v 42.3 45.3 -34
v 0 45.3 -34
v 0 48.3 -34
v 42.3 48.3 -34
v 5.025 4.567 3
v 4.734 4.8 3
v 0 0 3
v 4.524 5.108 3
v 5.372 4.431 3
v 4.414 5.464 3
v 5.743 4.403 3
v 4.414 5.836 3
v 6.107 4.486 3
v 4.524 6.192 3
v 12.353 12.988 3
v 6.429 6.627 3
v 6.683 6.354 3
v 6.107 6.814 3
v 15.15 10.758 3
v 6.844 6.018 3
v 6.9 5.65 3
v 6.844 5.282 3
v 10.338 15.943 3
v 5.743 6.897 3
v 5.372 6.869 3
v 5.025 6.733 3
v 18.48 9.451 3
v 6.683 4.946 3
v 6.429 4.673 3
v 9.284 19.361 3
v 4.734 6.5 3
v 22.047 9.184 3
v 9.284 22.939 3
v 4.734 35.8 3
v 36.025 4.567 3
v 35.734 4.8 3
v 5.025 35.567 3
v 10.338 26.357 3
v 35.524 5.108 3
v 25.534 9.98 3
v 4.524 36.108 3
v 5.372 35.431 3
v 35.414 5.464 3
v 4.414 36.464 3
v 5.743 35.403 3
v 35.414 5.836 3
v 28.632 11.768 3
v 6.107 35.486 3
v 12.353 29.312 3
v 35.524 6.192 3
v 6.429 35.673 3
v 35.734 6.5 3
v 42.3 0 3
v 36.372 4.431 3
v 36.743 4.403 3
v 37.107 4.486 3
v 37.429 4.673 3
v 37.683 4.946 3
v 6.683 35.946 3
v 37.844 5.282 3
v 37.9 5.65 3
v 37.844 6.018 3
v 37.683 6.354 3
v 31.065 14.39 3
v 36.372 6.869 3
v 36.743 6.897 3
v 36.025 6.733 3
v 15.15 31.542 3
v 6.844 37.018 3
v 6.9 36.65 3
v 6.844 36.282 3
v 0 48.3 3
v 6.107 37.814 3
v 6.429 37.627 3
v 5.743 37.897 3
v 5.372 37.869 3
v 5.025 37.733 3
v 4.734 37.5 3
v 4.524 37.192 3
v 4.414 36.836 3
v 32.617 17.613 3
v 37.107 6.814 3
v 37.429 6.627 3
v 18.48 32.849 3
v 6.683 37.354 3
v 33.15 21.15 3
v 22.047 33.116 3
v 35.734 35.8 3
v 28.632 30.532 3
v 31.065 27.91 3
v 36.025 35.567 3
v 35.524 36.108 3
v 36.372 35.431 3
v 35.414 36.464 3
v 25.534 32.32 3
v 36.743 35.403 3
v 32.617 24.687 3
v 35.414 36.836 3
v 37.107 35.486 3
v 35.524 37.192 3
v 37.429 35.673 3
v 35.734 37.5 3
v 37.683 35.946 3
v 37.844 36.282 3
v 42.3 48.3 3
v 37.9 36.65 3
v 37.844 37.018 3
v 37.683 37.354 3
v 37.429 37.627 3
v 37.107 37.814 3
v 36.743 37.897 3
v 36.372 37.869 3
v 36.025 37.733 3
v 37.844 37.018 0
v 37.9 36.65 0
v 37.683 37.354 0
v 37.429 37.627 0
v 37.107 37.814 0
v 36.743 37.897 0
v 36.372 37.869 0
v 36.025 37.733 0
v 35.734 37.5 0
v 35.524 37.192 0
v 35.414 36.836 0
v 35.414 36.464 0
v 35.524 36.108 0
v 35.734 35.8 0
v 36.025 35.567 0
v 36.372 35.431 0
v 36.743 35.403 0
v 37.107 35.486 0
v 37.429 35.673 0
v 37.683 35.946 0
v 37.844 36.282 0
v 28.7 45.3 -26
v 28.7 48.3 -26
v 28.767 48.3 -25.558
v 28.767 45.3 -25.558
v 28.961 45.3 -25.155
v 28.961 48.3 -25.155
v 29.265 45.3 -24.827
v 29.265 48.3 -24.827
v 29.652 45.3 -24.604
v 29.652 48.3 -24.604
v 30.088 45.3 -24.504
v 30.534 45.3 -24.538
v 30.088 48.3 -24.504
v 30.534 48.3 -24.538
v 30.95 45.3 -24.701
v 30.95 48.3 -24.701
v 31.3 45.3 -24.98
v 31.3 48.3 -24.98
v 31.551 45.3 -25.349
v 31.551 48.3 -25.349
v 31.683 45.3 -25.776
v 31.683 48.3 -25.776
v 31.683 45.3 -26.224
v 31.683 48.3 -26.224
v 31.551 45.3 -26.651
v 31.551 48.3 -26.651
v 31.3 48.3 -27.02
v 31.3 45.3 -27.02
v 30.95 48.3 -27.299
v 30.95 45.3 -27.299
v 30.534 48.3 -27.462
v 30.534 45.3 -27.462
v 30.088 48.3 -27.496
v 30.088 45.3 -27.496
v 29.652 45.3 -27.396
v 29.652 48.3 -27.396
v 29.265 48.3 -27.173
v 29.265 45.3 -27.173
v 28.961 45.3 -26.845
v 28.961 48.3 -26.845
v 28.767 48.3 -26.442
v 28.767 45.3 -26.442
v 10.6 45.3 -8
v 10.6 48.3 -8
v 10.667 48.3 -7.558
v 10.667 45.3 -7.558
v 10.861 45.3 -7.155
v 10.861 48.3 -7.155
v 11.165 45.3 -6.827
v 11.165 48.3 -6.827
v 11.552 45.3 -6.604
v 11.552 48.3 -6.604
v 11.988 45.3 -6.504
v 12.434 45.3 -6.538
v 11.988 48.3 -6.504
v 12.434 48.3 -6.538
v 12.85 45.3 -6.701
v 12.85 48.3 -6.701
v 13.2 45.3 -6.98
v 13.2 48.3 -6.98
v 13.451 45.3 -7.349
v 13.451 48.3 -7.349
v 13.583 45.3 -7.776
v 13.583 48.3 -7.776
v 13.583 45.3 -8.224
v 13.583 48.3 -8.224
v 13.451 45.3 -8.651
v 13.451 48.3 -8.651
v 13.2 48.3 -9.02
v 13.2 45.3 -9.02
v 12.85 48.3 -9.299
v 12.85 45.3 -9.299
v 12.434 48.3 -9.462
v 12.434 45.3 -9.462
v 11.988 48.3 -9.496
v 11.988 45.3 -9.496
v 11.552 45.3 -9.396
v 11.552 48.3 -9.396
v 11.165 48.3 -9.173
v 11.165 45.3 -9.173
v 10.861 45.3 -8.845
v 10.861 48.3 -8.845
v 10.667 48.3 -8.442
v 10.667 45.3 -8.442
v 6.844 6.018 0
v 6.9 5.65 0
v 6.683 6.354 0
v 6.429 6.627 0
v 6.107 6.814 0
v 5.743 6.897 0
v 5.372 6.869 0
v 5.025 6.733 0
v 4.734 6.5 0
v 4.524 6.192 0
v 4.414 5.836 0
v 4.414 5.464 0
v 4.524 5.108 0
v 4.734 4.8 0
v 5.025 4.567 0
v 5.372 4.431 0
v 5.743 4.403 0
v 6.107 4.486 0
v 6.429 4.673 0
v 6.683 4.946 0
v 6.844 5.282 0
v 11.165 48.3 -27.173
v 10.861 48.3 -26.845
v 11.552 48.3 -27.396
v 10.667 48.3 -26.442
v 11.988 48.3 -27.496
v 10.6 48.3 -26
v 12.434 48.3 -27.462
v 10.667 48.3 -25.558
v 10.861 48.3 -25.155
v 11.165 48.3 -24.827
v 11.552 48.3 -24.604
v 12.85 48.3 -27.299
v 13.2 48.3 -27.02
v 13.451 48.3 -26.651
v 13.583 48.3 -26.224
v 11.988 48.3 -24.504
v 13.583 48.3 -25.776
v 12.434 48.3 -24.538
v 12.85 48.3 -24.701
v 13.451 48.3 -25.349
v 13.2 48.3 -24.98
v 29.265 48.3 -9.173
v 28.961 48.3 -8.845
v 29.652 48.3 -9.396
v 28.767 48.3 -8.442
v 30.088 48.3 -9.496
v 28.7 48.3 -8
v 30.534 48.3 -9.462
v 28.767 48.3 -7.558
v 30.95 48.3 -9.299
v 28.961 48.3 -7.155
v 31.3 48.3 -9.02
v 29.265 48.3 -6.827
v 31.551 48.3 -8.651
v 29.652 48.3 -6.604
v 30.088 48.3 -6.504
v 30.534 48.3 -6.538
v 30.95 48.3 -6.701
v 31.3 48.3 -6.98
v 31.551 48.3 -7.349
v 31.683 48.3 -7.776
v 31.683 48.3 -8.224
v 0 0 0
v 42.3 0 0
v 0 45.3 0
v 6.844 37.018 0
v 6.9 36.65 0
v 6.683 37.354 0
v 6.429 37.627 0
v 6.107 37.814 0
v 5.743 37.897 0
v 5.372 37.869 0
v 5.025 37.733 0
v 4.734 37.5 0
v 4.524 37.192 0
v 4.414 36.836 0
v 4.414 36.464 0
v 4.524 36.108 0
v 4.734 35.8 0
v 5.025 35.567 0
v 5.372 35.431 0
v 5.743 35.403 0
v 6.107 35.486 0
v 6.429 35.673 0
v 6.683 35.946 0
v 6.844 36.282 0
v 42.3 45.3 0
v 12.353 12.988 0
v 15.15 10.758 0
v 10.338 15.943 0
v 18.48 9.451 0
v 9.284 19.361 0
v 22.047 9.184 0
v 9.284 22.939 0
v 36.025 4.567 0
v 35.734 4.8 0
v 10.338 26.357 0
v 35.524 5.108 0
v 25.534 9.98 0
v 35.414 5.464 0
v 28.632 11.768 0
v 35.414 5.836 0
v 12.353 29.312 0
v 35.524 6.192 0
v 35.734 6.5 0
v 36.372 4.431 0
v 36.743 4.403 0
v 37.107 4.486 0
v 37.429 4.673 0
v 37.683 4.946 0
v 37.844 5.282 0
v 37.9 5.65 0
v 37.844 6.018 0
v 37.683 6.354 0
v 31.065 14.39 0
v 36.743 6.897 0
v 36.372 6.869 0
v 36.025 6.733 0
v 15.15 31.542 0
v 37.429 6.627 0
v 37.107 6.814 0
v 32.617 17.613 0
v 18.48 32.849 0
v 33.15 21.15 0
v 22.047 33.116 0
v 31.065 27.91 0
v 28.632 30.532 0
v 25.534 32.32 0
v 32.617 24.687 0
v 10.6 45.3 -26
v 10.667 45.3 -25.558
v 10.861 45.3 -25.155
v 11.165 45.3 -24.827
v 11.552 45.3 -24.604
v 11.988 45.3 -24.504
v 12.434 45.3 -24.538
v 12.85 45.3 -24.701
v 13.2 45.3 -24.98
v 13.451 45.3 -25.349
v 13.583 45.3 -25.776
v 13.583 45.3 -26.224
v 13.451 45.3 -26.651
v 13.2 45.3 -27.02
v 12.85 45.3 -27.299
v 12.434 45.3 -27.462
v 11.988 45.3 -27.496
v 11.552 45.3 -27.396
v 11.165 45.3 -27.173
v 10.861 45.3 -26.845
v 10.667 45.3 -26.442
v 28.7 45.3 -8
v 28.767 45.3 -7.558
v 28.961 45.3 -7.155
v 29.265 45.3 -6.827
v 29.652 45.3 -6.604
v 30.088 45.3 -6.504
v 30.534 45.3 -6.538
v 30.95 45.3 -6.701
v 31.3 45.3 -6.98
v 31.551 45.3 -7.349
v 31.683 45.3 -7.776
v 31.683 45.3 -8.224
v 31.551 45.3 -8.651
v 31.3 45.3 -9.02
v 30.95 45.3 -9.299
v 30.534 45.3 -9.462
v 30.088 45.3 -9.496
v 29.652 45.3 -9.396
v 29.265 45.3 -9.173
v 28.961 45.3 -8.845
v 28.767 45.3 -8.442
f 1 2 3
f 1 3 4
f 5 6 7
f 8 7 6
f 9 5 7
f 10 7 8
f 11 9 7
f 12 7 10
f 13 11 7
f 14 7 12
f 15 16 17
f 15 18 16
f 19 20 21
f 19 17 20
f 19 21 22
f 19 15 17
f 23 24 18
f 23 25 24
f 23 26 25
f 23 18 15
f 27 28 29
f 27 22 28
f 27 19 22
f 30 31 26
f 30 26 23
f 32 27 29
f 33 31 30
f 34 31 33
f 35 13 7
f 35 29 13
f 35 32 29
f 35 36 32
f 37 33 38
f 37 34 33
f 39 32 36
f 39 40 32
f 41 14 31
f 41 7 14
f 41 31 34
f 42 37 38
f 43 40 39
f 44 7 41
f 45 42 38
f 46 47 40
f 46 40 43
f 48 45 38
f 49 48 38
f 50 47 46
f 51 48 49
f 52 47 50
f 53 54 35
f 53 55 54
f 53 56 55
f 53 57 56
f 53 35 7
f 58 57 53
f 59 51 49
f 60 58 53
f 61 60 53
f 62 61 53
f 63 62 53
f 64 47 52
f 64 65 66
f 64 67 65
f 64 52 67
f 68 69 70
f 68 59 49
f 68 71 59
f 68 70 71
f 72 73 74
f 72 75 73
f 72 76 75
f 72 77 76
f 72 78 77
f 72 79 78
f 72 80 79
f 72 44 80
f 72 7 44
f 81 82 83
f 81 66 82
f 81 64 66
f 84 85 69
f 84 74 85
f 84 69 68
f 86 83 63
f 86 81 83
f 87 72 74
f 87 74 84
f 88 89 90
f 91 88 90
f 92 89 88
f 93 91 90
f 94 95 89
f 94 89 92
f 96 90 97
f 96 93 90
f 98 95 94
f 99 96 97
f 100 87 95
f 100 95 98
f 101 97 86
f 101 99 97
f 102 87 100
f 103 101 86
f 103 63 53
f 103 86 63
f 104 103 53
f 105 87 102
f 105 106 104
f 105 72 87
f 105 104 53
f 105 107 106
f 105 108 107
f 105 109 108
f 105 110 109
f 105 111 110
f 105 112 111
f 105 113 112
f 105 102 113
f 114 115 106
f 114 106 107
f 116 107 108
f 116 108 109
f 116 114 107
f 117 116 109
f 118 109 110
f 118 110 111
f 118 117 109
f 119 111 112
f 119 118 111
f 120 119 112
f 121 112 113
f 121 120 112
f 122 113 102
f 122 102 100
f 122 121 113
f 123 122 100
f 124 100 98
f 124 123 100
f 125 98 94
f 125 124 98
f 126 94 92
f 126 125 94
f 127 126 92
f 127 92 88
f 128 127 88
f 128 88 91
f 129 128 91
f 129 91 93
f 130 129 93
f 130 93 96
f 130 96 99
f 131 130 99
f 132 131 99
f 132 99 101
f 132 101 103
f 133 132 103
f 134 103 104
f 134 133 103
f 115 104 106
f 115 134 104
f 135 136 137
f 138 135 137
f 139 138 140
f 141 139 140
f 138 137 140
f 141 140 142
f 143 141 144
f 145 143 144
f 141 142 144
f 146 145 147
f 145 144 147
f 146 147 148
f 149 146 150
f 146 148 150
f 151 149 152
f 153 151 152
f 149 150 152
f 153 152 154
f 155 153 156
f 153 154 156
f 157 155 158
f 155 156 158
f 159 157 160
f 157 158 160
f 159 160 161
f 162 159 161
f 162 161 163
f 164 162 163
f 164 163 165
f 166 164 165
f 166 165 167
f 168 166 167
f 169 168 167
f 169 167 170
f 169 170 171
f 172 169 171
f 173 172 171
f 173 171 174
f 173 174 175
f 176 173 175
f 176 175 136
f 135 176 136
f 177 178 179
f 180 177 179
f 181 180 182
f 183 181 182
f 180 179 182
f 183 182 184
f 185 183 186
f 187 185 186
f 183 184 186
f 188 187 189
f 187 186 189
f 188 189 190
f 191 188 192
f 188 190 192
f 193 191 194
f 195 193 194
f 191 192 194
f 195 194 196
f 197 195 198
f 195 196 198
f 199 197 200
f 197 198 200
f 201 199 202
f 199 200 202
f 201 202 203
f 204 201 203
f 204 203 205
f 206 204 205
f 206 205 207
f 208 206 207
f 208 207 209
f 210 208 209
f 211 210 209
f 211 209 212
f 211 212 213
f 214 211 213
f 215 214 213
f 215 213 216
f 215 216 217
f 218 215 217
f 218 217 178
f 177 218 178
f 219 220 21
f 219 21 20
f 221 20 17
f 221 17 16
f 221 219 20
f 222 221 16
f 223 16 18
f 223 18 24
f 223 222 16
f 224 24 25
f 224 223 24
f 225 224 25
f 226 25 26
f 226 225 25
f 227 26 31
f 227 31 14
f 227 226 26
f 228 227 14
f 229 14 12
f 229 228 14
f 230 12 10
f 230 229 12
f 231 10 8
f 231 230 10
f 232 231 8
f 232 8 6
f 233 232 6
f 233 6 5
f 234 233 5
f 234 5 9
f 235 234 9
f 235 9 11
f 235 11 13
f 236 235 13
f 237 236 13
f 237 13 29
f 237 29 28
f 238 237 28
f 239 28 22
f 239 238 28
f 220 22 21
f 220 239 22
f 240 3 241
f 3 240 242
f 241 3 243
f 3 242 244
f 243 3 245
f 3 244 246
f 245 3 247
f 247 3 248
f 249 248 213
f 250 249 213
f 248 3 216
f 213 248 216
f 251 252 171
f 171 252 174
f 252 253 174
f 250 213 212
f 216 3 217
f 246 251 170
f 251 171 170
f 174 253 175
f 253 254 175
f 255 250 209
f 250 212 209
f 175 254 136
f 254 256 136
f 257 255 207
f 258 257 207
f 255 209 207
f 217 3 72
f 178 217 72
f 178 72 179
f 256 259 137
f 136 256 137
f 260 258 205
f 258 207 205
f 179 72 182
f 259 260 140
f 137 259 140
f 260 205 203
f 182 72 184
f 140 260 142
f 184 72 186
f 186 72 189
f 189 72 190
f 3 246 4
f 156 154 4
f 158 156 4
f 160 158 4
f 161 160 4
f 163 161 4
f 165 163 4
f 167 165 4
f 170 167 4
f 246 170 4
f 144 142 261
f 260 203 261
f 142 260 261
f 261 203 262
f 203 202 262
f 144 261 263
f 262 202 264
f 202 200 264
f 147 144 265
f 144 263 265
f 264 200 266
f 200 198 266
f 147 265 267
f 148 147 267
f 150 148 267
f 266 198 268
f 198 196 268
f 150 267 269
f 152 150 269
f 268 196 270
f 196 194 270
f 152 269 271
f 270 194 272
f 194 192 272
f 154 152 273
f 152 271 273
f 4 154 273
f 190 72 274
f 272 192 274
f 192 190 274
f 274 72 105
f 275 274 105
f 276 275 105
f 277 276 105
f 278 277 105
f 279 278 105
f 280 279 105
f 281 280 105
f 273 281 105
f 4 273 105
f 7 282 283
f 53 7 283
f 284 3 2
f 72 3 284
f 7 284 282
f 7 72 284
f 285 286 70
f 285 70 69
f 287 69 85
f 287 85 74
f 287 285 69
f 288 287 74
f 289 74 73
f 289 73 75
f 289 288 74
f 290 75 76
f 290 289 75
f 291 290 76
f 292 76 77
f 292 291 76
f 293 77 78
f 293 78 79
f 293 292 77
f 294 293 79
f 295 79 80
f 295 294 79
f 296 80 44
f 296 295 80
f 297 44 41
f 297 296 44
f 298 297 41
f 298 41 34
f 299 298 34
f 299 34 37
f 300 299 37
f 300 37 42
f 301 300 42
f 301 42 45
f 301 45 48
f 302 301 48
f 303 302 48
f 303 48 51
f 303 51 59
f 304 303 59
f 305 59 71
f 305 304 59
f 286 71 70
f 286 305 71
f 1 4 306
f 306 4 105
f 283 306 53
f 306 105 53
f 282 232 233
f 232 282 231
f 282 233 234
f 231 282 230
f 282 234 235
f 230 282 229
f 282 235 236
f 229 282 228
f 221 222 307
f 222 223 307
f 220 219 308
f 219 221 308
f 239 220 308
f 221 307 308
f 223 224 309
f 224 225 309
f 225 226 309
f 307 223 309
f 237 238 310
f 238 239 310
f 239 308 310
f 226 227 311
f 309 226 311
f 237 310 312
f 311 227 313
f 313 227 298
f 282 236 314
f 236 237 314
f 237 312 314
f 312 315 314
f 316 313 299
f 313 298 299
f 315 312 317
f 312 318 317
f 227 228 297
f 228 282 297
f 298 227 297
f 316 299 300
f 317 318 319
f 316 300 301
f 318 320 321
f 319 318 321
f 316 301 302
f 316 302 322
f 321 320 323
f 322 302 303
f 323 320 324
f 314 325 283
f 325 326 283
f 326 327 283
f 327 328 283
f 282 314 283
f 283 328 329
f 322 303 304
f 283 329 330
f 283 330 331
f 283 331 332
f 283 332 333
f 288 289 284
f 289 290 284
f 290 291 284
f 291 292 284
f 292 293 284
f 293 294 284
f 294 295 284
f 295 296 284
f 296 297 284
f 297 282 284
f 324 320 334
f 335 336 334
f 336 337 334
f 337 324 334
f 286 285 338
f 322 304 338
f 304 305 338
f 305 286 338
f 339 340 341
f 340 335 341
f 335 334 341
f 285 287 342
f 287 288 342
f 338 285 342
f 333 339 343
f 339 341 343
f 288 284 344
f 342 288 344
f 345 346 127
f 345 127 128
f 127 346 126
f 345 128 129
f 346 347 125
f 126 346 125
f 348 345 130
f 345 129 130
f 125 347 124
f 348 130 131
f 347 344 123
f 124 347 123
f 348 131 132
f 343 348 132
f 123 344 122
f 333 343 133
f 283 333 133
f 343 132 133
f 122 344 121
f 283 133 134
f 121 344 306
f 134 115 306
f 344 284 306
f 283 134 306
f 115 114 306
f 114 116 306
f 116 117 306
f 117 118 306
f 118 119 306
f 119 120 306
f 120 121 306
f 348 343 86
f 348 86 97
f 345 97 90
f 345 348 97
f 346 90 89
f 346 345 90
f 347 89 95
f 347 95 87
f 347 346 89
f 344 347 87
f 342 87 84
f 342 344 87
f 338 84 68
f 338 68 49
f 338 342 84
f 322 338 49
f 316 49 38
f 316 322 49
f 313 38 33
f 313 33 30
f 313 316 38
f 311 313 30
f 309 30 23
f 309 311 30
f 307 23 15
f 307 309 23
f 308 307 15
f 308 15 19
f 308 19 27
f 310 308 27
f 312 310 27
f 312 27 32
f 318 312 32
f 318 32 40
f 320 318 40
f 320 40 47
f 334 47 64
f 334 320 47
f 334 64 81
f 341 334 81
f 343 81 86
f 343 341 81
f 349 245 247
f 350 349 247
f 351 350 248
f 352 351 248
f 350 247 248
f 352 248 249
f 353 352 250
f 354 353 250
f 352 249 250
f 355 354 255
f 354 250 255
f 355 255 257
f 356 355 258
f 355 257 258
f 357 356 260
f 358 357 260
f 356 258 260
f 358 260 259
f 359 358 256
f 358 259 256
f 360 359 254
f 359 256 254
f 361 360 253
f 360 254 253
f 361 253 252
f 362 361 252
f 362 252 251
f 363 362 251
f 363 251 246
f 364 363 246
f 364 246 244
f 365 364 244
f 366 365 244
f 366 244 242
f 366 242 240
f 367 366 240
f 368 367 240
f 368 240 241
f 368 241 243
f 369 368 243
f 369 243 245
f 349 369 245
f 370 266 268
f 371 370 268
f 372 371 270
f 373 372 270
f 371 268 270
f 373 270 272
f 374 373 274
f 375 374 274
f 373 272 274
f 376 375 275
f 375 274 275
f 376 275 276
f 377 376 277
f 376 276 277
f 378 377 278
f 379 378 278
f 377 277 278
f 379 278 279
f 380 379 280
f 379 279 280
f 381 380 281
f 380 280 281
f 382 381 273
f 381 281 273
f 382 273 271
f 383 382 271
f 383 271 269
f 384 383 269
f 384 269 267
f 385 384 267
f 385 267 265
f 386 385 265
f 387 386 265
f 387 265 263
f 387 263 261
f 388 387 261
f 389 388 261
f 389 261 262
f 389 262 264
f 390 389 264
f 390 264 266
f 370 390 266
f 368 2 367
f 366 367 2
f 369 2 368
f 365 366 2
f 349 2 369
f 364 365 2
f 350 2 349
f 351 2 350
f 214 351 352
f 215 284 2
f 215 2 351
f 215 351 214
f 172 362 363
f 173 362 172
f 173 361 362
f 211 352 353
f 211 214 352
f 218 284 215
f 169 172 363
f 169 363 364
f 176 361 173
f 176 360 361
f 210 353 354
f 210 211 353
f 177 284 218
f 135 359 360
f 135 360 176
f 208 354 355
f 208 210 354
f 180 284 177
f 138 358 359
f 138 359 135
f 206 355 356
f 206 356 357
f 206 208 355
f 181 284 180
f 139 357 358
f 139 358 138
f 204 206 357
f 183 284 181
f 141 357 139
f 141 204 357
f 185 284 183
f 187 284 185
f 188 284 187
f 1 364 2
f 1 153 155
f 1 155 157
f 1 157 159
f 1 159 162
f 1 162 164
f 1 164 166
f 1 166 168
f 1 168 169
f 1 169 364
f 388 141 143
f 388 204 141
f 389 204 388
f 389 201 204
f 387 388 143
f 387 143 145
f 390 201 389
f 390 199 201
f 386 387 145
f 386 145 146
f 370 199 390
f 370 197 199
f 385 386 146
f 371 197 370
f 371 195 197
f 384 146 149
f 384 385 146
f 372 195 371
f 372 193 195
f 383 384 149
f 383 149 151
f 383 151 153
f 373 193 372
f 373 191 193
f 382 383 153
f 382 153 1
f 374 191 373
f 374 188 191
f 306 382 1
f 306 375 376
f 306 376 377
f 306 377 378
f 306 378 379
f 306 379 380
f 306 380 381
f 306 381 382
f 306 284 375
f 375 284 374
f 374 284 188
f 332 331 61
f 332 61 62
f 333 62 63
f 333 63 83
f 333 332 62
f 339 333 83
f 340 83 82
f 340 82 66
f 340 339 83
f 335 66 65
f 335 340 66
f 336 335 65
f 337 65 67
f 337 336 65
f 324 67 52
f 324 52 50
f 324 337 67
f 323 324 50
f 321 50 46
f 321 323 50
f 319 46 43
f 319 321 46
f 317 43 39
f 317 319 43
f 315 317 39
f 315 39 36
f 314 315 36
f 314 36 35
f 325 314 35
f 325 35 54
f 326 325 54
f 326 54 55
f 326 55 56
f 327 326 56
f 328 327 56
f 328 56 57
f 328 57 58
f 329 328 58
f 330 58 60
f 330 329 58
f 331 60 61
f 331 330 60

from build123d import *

# Parameters (mm, degrees)
SKETCH_W     = 42.3
SKETCH_H     = 48.3
SKETCH_R     = 1.25
SKETCH_R_2   = 12
PAD_DEPTH    = 3
SKETCH001_W  = 42.3
SKETCH001_H  = 3
PAD001_DEPTH = 34
SKETCH002_R  = 1.5
POCKET_DEPTH = 48.301


with BuildPart() as part:
    # Sketch → Pad (new body)
    with BuildSketch(Plane.XY):
        with Locations((21.15, 24.15)):
            Rectangle(SKETCH_W, SKETCH_H)
        with Locations((5.65, 36.65)):
            Circle(SKETCH_R, mode=Mode.SUBTRACT)
        with Locations((36.65, 36.65)):
            Circle(SKETCH_R, mode=Mode.SUBTRACT)
        with Locations((5.65, 5.65)):
            Circle(SKETCH_R, mode=Mode.SUBTRACT)
        with Locations((36.65, 5.65)):
            Circle(SKETCH_R, mode=Mode.SUBTRACT)
        with Locations((21.15, 21.15)):
            Circle(SKETCH_R_2, mode=Mode.SUBTRACT)
    extrude(amount=PAD_DEPTH)

    # Sketch001 → Pad001 (new body)
    with BuildSketch(Plane(origin=(0, 0, 0), x_dir=(1, 0, 0), z_dir=(0, 0, -1))):
        with Locations((21.15, -46.8)):
            Rectangle(SKETCH001_W, SKETCH001_H)
    extrude(amount=PAD001_DEPTH)

    # Sketch002 → Pocket (cut, through all)
    with BuildSketch(Plane(origin=(0, 48.3, 0), x_dir=(-1, 0, 0), z_dir=(0, 1, 0))):
        with Locations((-30.2, -8)):
            Circle(SKETCH002_R)
        with Locations((-12.1, -8)):
            Circle(SKETCH002_R)
        with Locations((-30.2, -26)):
            Circle(SKETCH002_R)
        with Locations((-12.1, -26)):
            Circle(SKETCH002_R)
    extrude(amount=-POCKET_DEPTH, mode=Mode.SUBTRACT)


solid = part.part
